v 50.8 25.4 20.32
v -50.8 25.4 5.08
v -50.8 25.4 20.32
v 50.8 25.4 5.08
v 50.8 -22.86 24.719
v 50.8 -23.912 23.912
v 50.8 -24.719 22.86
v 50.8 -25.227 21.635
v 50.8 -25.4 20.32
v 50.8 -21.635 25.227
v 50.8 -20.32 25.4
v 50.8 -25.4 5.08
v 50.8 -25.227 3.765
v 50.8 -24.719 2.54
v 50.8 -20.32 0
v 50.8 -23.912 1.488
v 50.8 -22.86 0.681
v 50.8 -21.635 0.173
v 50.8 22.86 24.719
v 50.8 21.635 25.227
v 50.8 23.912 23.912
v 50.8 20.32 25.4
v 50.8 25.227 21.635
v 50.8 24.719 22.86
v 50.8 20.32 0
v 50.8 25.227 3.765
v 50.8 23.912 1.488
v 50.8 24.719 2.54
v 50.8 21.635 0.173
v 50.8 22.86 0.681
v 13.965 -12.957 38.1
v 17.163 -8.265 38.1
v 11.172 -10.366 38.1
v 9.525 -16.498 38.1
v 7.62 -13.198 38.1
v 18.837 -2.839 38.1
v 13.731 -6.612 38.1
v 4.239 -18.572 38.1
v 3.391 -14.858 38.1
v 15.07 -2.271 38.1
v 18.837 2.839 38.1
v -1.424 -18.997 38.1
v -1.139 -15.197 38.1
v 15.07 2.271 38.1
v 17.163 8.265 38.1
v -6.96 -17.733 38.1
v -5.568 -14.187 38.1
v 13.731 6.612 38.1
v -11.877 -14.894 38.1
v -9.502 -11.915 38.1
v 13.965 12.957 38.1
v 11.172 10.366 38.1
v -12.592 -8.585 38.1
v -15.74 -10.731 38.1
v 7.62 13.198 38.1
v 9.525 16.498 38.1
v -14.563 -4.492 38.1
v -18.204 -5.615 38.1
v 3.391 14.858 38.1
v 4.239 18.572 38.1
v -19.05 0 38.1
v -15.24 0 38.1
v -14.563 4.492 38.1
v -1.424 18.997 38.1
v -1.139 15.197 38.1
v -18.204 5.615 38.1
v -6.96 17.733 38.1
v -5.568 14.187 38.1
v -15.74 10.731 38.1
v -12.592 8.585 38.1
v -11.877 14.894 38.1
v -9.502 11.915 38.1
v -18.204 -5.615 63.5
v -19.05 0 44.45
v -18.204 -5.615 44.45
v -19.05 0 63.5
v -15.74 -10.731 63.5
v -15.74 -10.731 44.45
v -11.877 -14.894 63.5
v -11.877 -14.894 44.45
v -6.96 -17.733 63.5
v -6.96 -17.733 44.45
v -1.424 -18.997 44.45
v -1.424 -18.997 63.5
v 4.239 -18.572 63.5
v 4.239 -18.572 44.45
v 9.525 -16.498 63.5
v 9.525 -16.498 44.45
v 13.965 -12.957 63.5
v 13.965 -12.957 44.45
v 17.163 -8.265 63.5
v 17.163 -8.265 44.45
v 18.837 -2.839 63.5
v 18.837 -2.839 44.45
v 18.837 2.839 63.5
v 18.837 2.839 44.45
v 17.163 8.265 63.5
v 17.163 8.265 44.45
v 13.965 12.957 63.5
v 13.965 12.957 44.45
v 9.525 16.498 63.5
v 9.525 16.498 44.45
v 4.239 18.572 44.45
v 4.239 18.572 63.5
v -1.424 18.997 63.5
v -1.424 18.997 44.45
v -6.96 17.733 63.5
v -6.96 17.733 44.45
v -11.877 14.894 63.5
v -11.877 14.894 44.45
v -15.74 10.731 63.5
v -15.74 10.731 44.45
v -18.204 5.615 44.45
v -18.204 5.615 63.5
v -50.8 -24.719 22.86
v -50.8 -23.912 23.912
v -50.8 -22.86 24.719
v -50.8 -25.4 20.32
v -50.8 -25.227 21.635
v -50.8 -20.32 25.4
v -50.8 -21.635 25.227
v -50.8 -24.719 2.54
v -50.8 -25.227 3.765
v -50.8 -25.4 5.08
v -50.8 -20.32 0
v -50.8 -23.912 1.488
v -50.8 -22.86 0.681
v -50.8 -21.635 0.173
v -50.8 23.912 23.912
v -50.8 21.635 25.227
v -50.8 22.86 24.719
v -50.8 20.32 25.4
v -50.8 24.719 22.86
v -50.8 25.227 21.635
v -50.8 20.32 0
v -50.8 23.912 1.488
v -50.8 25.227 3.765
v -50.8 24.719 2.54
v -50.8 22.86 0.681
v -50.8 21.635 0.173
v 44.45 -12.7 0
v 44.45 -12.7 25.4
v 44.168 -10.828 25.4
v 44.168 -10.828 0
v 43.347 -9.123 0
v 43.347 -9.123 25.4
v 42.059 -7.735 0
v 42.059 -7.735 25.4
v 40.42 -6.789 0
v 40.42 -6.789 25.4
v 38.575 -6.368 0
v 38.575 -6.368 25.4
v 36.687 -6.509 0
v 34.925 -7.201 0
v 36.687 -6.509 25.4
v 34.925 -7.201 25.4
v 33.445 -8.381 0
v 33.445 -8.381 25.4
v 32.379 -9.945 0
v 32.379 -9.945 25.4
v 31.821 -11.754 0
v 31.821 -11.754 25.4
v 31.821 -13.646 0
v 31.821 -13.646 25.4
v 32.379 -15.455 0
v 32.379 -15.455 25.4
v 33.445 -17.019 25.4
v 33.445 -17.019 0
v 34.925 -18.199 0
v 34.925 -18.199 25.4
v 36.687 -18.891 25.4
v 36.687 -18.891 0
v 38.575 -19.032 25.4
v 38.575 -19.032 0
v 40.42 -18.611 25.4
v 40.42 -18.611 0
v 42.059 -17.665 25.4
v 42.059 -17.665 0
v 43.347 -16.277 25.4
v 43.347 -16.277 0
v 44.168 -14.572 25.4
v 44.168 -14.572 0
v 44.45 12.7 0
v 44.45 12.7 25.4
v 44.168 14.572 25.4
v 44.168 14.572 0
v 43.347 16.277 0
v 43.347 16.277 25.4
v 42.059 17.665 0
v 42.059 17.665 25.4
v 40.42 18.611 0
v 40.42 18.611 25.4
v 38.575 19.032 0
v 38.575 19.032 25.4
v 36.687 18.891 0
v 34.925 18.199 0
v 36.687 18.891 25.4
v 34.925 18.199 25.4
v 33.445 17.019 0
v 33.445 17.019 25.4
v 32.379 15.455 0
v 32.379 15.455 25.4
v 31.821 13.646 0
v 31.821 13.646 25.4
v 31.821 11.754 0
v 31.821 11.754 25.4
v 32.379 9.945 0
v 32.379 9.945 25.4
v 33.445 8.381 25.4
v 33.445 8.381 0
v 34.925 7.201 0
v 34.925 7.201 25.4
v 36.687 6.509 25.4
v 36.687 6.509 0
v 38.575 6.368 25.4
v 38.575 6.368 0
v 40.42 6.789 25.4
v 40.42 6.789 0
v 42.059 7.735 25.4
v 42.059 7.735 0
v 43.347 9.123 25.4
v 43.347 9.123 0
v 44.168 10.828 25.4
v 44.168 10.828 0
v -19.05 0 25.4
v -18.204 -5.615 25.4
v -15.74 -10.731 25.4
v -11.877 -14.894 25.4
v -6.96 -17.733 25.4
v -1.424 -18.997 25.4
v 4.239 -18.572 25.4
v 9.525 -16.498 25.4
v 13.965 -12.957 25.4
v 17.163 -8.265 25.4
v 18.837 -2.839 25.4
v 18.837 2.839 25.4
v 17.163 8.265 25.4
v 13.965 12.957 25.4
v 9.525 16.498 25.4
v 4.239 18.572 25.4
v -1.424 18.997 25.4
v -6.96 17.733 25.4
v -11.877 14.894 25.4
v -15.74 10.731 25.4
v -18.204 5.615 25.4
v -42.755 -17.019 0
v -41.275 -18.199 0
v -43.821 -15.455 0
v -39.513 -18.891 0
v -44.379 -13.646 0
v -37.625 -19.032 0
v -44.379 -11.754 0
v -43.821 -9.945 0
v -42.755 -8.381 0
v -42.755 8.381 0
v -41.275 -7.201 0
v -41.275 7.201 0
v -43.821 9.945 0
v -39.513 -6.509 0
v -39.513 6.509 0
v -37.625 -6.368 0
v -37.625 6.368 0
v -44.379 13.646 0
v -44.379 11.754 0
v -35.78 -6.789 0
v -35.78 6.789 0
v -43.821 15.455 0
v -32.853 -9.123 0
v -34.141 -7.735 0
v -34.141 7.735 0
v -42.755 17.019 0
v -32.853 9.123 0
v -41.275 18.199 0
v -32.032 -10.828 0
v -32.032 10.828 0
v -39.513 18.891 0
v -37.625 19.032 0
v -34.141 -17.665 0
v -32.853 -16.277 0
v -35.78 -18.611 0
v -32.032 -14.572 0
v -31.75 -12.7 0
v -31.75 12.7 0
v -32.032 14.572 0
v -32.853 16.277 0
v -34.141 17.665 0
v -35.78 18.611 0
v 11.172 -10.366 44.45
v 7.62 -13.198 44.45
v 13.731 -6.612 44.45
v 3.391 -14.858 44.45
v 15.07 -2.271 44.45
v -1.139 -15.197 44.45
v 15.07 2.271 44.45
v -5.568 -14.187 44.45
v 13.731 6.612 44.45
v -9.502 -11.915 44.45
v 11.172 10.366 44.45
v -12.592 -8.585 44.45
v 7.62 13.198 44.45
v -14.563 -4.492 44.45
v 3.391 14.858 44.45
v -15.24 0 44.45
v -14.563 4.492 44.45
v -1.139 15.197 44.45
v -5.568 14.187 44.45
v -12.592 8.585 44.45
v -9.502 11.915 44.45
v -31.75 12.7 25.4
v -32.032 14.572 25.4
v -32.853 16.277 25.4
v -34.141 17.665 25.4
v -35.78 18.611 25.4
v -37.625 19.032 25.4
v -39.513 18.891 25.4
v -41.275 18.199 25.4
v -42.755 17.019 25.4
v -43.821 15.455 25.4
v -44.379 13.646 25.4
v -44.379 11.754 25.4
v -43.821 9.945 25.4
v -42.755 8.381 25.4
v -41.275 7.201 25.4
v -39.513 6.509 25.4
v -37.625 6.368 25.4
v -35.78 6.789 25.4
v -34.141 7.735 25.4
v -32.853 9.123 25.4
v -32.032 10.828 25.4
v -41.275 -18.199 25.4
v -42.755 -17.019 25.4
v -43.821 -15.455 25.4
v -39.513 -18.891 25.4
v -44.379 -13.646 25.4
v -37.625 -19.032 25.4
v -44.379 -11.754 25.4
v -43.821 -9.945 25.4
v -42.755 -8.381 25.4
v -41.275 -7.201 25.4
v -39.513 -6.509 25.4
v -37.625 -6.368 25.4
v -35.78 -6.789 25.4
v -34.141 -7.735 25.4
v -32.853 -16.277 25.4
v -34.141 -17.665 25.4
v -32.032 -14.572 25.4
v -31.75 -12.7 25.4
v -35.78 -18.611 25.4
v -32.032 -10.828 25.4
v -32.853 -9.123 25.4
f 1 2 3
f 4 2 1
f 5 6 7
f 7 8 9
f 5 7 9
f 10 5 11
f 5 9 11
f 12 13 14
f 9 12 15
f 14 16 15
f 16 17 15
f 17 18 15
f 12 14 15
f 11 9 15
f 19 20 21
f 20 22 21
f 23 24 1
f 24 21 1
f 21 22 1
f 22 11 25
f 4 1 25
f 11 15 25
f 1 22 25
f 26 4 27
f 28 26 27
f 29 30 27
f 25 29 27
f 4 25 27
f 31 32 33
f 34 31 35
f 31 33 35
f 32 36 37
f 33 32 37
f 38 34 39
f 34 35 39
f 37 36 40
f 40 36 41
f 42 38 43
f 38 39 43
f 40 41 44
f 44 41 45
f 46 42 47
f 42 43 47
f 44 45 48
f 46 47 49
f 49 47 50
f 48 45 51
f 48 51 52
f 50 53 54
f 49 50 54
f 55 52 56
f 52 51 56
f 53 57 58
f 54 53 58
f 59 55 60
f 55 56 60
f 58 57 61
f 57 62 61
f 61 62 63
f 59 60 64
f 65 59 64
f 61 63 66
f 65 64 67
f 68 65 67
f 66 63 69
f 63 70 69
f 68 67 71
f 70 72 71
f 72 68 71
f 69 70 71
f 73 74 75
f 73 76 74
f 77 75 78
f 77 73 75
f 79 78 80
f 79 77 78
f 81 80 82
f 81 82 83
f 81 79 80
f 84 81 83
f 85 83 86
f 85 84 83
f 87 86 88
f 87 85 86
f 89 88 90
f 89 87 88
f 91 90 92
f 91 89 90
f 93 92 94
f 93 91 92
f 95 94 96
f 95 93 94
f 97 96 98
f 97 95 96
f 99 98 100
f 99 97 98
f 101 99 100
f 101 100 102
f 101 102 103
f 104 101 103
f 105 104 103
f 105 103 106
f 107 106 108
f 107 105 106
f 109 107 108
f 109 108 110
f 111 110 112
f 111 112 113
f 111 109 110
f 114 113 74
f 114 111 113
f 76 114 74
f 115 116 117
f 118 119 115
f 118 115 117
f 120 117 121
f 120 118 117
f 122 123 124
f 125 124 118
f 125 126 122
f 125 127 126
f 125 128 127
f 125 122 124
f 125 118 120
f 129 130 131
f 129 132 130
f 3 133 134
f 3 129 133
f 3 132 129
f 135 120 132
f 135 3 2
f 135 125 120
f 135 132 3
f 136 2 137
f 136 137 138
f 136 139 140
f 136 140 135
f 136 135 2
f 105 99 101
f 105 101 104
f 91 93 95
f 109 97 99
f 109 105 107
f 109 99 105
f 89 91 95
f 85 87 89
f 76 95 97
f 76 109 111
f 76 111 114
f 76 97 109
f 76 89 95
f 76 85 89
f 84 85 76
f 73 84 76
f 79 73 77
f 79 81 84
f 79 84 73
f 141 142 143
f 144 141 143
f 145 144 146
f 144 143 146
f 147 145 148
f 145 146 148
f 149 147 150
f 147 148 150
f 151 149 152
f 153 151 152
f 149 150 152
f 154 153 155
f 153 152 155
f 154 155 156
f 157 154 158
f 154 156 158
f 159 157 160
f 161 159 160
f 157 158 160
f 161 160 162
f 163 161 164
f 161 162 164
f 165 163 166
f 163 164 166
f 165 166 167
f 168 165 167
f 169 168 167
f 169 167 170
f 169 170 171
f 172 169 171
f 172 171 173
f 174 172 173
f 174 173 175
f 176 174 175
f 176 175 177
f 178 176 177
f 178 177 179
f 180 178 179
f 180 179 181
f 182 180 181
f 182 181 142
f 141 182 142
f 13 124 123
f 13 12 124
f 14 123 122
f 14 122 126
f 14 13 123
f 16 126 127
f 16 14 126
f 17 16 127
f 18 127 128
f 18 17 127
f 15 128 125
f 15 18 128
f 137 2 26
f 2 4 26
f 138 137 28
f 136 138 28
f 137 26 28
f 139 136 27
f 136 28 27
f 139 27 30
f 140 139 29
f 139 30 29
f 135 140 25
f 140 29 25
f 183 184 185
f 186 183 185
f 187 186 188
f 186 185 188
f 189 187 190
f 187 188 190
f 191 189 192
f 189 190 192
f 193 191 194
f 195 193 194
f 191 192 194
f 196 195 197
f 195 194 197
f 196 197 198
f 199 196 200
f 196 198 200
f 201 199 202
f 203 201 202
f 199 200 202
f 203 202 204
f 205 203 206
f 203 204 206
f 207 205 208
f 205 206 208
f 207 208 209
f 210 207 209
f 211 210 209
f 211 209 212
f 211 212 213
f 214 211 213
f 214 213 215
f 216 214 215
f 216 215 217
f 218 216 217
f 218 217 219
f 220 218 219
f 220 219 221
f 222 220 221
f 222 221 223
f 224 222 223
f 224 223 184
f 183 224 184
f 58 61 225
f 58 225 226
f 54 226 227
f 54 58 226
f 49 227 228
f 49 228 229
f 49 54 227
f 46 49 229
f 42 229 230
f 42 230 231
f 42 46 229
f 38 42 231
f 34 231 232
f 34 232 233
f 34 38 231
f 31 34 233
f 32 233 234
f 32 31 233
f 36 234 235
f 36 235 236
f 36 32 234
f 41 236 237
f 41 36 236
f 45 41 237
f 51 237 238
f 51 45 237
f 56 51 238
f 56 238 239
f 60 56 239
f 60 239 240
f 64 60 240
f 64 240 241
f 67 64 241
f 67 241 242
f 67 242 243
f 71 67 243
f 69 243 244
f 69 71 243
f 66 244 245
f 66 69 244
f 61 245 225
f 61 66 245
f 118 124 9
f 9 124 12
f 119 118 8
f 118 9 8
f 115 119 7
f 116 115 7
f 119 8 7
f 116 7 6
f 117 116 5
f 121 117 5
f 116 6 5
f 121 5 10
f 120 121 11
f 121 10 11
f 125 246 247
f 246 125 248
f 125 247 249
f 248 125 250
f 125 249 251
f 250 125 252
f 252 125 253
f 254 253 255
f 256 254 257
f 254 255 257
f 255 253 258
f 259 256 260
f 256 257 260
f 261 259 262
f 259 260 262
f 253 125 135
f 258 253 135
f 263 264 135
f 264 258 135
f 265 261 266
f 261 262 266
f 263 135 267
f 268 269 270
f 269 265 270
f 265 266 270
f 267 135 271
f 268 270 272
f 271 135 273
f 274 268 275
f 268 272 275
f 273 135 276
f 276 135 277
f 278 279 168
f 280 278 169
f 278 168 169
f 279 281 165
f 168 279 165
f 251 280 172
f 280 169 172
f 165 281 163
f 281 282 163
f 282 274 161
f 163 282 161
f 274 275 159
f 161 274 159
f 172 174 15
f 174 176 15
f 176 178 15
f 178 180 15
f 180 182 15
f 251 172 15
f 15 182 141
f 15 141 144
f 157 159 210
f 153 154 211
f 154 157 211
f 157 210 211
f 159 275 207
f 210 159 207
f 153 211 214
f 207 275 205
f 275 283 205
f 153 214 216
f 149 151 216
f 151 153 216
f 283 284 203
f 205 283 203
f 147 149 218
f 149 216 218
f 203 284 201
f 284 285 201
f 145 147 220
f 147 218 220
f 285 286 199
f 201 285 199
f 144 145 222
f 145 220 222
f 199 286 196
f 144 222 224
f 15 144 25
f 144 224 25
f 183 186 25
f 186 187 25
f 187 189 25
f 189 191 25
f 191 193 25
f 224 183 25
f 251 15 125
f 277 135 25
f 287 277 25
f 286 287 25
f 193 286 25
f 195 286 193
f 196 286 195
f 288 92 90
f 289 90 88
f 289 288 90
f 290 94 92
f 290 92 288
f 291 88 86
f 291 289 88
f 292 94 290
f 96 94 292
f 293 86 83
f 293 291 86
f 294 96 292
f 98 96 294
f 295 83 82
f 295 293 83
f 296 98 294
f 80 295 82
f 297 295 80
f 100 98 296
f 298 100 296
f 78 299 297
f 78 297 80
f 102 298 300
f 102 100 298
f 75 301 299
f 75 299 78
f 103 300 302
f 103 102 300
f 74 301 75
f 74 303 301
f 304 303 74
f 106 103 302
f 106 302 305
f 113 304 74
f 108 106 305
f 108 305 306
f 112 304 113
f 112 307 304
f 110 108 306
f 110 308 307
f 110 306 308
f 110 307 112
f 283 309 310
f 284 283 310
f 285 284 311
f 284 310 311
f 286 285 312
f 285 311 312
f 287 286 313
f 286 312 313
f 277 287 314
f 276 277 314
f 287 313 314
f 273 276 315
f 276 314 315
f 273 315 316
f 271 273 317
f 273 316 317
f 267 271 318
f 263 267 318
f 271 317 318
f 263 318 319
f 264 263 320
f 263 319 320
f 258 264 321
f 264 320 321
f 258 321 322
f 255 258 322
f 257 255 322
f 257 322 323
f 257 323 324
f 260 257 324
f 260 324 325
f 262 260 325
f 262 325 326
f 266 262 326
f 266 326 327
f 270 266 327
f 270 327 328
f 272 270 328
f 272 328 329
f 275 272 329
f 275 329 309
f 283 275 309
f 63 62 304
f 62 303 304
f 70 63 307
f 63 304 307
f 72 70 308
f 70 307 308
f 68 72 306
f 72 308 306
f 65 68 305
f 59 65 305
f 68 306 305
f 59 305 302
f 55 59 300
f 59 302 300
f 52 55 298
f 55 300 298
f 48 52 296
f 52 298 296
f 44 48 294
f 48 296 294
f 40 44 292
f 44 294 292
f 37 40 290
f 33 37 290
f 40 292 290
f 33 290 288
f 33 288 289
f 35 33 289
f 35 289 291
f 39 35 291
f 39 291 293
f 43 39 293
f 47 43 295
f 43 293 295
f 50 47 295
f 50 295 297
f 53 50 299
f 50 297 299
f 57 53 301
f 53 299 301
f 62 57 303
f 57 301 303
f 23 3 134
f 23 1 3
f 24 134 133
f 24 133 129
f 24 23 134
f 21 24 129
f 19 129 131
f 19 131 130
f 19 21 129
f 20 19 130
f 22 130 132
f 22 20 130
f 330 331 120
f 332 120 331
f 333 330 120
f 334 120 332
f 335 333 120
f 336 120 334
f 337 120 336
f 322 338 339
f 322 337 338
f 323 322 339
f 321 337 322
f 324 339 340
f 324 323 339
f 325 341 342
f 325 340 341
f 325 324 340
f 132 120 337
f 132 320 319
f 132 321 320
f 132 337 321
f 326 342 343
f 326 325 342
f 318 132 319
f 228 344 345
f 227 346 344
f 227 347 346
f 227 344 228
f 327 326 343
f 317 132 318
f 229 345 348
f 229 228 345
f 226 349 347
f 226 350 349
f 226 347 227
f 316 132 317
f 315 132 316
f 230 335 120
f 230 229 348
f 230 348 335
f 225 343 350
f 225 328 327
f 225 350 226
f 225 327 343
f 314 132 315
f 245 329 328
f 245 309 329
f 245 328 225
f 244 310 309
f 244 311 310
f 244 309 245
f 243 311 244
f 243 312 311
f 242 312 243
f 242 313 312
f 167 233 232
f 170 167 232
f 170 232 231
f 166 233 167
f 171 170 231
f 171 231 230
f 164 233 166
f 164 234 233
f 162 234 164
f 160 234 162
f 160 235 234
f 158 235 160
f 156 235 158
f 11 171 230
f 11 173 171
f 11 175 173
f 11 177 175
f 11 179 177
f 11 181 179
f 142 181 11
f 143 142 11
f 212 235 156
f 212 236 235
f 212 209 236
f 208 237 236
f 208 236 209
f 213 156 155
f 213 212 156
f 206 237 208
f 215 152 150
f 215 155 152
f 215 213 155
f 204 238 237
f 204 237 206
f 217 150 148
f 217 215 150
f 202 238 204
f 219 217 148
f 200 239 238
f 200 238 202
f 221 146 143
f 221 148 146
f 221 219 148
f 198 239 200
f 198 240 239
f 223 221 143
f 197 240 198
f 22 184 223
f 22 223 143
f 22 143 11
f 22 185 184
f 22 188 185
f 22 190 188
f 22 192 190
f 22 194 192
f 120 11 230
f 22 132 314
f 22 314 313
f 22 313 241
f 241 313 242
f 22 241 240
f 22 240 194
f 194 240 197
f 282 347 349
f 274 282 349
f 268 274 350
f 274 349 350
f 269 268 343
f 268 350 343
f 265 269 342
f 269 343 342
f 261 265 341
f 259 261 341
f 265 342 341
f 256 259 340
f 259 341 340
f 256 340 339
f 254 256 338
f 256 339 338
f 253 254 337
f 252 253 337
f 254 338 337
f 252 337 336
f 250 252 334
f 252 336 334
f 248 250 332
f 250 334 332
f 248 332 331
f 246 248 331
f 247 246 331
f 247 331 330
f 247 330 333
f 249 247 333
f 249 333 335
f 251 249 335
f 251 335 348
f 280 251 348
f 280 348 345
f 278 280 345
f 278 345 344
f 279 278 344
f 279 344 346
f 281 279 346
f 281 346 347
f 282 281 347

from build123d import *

# Parameters (mm, degrees)
F0_W     = 101.6
F0_H     = 50.8
F1_DEPTH = 25.4
F2_R     = 6.35
F3_DEPTH = 25.401
F4_W     = 19.05
F4_H     = 38.1
F6_R     = 5.08
F7_W     = 7.721651
F7_H     = 6.35


with BuildPart() as f1:
    # F0 (on Top) → F1 (new body)
    with BuildSketch(Plane.XY):
        Rectangle(F0_W, F0_H)
    extrude(amount=F1_DEPTH)

    # F2 (on face) → F3 (cut, through all)
    with BuildSketch(Plane.XY.offset(25.4)):
        with Locations((-38.1, 12.7)):
            Circle(F2_R)
        with Locations((38.1, 12.7)):
            Circle(F2_R)
        with Locations((-38.1, -12.7)):
            Circle(F2_R)
        with Locations((38.1, -12.7)):
            Circle(F2_R)
    extrude(amount=-F3_DEPTH, mode=Mode.SUBTRACT)

    # F4 (on Front) → F5 (revolve)
    with BuildSketch(Plane.XZ):
        with Locations((-9.525, 44.45)):
            Rectangle(F4_W, F4_H)
    revolve(axis=Axis((0, 0, 44.45), (0, 0, 1)))

    # F6
    f6_edges = [f1.edges().sort_by_distance(p)[0] for p in [
        (0, -25.4, 25.4),
        (0, -25.4, 0),
        (0, 25.4, 25.4),
        (0, 25.4, 0),
    ]]
    fillet(f6_edges, radius=F6_R)

    # F7 (on Front) → F8 (revolve, cut)
    with BuildSketch(Plane.XZ):
        with Locations((-19.100825, 41.275)):
            Rectangle(F7_W, F7_H)
    revolve(axis=Axis((0, 0, 63.5), (0, 0, -1)), mode=Mode.SUBTRACT)


solid = f1.part
